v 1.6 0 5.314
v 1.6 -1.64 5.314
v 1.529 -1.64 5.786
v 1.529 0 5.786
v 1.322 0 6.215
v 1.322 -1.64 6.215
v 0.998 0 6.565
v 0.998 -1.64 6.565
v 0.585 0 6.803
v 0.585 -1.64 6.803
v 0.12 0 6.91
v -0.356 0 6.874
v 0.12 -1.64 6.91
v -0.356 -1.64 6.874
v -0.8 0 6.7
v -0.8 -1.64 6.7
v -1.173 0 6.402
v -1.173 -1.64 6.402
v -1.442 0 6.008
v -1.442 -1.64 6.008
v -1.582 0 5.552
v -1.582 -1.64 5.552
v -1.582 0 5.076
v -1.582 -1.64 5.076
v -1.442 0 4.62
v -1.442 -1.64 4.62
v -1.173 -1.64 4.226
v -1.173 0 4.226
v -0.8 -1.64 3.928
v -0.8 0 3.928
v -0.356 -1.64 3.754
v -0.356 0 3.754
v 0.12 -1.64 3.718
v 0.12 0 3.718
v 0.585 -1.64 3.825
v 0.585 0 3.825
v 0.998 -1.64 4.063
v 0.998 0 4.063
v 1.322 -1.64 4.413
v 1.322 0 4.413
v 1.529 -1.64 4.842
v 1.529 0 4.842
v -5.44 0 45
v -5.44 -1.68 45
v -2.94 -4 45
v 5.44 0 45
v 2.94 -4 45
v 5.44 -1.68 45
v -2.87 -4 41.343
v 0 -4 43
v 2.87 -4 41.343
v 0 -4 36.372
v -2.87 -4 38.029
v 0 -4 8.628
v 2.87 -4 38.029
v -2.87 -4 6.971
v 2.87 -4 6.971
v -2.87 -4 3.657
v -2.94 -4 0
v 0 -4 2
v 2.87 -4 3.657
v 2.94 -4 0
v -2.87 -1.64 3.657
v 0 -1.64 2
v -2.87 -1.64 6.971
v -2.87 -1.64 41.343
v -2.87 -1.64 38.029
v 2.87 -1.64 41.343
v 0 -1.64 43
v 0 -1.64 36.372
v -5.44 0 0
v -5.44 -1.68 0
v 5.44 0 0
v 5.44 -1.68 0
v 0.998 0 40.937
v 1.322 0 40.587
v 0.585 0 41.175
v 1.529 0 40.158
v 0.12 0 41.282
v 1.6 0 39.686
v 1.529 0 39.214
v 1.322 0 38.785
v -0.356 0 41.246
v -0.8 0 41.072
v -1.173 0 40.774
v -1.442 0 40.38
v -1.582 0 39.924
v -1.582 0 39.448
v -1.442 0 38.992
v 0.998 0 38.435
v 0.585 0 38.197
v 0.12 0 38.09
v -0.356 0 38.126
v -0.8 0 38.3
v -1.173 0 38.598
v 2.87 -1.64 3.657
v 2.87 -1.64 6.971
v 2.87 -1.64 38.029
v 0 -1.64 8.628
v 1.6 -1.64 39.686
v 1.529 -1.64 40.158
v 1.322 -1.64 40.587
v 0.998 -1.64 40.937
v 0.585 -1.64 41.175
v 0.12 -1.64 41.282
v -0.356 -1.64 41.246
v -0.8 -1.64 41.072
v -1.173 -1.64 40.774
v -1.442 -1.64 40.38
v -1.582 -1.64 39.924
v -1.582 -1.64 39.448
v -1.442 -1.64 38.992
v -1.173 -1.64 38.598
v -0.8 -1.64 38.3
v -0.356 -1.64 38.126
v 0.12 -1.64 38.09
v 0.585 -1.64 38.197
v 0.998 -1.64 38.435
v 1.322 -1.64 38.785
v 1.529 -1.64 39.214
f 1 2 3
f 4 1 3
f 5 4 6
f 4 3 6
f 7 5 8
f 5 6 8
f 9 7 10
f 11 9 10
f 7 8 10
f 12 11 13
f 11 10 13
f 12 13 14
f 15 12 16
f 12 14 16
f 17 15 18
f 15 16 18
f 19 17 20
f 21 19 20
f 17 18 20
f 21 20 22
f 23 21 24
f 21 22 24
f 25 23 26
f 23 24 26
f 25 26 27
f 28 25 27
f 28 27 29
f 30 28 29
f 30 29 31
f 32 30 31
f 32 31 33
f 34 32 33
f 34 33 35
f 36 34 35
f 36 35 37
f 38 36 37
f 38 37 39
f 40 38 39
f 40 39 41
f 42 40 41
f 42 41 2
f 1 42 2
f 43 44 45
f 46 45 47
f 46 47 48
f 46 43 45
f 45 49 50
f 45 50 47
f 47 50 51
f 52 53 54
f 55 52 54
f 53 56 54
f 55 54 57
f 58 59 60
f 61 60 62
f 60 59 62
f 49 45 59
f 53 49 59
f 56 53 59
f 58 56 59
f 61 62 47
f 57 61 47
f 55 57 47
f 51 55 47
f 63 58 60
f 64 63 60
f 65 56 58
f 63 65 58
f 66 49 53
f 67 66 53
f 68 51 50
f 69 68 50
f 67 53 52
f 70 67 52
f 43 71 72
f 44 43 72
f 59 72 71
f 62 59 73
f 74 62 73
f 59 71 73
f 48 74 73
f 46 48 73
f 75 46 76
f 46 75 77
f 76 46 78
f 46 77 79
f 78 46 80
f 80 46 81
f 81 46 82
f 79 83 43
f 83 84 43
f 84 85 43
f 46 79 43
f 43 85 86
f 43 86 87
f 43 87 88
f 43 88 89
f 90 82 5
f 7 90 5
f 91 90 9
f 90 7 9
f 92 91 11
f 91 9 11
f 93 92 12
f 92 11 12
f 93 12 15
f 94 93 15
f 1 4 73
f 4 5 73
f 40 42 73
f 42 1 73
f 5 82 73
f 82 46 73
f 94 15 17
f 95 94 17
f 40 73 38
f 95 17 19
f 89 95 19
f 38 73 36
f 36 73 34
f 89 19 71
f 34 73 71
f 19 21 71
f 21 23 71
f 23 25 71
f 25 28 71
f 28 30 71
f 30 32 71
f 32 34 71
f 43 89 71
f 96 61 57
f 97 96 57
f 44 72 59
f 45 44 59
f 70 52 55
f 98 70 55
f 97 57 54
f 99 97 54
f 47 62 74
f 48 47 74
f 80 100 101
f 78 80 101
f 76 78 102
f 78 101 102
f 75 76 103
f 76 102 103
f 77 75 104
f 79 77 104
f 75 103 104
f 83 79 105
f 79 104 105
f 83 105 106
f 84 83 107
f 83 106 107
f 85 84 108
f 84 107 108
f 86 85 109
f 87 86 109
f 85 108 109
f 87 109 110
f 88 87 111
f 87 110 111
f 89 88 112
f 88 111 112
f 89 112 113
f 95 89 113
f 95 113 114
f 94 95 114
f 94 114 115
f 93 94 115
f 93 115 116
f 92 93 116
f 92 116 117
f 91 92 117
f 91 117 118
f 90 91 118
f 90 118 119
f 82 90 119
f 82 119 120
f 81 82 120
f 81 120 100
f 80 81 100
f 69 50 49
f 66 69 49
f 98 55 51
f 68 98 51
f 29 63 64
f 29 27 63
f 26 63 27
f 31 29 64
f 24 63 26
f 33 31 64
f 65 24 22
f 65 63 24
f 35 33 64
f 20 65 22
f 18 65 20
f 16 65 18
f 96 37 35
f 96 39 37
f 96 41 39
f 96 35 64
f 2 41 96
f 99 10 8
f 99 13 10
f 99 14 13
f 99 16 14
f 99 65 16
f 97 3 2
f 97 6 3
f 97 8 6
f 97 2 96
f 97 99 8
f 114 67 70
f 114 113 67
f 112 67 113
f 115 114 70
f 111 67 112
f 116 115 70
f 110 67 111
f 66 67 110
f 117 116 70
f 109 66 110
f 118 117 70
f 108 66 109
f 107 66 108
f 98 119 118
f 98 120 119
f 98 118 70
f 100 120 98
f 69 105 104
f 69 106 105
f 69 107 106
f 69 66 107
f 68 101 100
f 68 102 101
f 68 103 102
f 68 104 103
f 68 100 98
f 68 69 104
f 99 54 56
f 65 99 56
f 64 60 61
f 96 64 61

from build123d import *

# Parameters (mm, degrees)
PAD_DEPTH       = 45
SKETCH001_R     = 1.6
POCKET_DEPTH    = 4.001
POCKET001_DEPTH = 2.36


with BuildPart() as part:
    # Sketch → Pad (new body)
    with BuildSketch(Plane.XY):
        Polygon((0, 0), (-5.44, 0), (-5.44, -1.68), (-2.94, -4), (0, -4), (2.94, -4), (5.44, -1.68), (5.44, 0), align=None)
    extrude(amount=PAD_DEPTH)

    # Sketch001 (on Face5 of Pad) → Pocket (cut, through all)
    with BuildSketch(Plane.XZ.offset(4)):
        with Locations((0, 39.686009)):
            Circle(SKETCH001_R)
        with Locations((0, 5.313991)):
            Circle(SKETCH001_R)
    extrude(amount=-POCKET_DEPTH, mode=Mode.SUBTRACT)

    # Sketch002 (on Face10 of Pocket) → Pocket001 (cut)
    with BuildSketch(Plane.XZ.offset(4)):
        Polygon((2.87, 41.343005), (0, 43), (-2.87, 41.343005), (-2.87, 38.029014), (0, 36.372019), (2.87, 38.029014), align=None)
        Polygon((2.87, 6.970986), (0, 8.627981), (-2.87, 6.970986), (-2.87, 3.656995), (0, 2), (2.87, 3.656995), align=None)
    extrude(amount=-POCKET001_DEPTH, mode=Mode.SUBTRACT)


solid = part.part
